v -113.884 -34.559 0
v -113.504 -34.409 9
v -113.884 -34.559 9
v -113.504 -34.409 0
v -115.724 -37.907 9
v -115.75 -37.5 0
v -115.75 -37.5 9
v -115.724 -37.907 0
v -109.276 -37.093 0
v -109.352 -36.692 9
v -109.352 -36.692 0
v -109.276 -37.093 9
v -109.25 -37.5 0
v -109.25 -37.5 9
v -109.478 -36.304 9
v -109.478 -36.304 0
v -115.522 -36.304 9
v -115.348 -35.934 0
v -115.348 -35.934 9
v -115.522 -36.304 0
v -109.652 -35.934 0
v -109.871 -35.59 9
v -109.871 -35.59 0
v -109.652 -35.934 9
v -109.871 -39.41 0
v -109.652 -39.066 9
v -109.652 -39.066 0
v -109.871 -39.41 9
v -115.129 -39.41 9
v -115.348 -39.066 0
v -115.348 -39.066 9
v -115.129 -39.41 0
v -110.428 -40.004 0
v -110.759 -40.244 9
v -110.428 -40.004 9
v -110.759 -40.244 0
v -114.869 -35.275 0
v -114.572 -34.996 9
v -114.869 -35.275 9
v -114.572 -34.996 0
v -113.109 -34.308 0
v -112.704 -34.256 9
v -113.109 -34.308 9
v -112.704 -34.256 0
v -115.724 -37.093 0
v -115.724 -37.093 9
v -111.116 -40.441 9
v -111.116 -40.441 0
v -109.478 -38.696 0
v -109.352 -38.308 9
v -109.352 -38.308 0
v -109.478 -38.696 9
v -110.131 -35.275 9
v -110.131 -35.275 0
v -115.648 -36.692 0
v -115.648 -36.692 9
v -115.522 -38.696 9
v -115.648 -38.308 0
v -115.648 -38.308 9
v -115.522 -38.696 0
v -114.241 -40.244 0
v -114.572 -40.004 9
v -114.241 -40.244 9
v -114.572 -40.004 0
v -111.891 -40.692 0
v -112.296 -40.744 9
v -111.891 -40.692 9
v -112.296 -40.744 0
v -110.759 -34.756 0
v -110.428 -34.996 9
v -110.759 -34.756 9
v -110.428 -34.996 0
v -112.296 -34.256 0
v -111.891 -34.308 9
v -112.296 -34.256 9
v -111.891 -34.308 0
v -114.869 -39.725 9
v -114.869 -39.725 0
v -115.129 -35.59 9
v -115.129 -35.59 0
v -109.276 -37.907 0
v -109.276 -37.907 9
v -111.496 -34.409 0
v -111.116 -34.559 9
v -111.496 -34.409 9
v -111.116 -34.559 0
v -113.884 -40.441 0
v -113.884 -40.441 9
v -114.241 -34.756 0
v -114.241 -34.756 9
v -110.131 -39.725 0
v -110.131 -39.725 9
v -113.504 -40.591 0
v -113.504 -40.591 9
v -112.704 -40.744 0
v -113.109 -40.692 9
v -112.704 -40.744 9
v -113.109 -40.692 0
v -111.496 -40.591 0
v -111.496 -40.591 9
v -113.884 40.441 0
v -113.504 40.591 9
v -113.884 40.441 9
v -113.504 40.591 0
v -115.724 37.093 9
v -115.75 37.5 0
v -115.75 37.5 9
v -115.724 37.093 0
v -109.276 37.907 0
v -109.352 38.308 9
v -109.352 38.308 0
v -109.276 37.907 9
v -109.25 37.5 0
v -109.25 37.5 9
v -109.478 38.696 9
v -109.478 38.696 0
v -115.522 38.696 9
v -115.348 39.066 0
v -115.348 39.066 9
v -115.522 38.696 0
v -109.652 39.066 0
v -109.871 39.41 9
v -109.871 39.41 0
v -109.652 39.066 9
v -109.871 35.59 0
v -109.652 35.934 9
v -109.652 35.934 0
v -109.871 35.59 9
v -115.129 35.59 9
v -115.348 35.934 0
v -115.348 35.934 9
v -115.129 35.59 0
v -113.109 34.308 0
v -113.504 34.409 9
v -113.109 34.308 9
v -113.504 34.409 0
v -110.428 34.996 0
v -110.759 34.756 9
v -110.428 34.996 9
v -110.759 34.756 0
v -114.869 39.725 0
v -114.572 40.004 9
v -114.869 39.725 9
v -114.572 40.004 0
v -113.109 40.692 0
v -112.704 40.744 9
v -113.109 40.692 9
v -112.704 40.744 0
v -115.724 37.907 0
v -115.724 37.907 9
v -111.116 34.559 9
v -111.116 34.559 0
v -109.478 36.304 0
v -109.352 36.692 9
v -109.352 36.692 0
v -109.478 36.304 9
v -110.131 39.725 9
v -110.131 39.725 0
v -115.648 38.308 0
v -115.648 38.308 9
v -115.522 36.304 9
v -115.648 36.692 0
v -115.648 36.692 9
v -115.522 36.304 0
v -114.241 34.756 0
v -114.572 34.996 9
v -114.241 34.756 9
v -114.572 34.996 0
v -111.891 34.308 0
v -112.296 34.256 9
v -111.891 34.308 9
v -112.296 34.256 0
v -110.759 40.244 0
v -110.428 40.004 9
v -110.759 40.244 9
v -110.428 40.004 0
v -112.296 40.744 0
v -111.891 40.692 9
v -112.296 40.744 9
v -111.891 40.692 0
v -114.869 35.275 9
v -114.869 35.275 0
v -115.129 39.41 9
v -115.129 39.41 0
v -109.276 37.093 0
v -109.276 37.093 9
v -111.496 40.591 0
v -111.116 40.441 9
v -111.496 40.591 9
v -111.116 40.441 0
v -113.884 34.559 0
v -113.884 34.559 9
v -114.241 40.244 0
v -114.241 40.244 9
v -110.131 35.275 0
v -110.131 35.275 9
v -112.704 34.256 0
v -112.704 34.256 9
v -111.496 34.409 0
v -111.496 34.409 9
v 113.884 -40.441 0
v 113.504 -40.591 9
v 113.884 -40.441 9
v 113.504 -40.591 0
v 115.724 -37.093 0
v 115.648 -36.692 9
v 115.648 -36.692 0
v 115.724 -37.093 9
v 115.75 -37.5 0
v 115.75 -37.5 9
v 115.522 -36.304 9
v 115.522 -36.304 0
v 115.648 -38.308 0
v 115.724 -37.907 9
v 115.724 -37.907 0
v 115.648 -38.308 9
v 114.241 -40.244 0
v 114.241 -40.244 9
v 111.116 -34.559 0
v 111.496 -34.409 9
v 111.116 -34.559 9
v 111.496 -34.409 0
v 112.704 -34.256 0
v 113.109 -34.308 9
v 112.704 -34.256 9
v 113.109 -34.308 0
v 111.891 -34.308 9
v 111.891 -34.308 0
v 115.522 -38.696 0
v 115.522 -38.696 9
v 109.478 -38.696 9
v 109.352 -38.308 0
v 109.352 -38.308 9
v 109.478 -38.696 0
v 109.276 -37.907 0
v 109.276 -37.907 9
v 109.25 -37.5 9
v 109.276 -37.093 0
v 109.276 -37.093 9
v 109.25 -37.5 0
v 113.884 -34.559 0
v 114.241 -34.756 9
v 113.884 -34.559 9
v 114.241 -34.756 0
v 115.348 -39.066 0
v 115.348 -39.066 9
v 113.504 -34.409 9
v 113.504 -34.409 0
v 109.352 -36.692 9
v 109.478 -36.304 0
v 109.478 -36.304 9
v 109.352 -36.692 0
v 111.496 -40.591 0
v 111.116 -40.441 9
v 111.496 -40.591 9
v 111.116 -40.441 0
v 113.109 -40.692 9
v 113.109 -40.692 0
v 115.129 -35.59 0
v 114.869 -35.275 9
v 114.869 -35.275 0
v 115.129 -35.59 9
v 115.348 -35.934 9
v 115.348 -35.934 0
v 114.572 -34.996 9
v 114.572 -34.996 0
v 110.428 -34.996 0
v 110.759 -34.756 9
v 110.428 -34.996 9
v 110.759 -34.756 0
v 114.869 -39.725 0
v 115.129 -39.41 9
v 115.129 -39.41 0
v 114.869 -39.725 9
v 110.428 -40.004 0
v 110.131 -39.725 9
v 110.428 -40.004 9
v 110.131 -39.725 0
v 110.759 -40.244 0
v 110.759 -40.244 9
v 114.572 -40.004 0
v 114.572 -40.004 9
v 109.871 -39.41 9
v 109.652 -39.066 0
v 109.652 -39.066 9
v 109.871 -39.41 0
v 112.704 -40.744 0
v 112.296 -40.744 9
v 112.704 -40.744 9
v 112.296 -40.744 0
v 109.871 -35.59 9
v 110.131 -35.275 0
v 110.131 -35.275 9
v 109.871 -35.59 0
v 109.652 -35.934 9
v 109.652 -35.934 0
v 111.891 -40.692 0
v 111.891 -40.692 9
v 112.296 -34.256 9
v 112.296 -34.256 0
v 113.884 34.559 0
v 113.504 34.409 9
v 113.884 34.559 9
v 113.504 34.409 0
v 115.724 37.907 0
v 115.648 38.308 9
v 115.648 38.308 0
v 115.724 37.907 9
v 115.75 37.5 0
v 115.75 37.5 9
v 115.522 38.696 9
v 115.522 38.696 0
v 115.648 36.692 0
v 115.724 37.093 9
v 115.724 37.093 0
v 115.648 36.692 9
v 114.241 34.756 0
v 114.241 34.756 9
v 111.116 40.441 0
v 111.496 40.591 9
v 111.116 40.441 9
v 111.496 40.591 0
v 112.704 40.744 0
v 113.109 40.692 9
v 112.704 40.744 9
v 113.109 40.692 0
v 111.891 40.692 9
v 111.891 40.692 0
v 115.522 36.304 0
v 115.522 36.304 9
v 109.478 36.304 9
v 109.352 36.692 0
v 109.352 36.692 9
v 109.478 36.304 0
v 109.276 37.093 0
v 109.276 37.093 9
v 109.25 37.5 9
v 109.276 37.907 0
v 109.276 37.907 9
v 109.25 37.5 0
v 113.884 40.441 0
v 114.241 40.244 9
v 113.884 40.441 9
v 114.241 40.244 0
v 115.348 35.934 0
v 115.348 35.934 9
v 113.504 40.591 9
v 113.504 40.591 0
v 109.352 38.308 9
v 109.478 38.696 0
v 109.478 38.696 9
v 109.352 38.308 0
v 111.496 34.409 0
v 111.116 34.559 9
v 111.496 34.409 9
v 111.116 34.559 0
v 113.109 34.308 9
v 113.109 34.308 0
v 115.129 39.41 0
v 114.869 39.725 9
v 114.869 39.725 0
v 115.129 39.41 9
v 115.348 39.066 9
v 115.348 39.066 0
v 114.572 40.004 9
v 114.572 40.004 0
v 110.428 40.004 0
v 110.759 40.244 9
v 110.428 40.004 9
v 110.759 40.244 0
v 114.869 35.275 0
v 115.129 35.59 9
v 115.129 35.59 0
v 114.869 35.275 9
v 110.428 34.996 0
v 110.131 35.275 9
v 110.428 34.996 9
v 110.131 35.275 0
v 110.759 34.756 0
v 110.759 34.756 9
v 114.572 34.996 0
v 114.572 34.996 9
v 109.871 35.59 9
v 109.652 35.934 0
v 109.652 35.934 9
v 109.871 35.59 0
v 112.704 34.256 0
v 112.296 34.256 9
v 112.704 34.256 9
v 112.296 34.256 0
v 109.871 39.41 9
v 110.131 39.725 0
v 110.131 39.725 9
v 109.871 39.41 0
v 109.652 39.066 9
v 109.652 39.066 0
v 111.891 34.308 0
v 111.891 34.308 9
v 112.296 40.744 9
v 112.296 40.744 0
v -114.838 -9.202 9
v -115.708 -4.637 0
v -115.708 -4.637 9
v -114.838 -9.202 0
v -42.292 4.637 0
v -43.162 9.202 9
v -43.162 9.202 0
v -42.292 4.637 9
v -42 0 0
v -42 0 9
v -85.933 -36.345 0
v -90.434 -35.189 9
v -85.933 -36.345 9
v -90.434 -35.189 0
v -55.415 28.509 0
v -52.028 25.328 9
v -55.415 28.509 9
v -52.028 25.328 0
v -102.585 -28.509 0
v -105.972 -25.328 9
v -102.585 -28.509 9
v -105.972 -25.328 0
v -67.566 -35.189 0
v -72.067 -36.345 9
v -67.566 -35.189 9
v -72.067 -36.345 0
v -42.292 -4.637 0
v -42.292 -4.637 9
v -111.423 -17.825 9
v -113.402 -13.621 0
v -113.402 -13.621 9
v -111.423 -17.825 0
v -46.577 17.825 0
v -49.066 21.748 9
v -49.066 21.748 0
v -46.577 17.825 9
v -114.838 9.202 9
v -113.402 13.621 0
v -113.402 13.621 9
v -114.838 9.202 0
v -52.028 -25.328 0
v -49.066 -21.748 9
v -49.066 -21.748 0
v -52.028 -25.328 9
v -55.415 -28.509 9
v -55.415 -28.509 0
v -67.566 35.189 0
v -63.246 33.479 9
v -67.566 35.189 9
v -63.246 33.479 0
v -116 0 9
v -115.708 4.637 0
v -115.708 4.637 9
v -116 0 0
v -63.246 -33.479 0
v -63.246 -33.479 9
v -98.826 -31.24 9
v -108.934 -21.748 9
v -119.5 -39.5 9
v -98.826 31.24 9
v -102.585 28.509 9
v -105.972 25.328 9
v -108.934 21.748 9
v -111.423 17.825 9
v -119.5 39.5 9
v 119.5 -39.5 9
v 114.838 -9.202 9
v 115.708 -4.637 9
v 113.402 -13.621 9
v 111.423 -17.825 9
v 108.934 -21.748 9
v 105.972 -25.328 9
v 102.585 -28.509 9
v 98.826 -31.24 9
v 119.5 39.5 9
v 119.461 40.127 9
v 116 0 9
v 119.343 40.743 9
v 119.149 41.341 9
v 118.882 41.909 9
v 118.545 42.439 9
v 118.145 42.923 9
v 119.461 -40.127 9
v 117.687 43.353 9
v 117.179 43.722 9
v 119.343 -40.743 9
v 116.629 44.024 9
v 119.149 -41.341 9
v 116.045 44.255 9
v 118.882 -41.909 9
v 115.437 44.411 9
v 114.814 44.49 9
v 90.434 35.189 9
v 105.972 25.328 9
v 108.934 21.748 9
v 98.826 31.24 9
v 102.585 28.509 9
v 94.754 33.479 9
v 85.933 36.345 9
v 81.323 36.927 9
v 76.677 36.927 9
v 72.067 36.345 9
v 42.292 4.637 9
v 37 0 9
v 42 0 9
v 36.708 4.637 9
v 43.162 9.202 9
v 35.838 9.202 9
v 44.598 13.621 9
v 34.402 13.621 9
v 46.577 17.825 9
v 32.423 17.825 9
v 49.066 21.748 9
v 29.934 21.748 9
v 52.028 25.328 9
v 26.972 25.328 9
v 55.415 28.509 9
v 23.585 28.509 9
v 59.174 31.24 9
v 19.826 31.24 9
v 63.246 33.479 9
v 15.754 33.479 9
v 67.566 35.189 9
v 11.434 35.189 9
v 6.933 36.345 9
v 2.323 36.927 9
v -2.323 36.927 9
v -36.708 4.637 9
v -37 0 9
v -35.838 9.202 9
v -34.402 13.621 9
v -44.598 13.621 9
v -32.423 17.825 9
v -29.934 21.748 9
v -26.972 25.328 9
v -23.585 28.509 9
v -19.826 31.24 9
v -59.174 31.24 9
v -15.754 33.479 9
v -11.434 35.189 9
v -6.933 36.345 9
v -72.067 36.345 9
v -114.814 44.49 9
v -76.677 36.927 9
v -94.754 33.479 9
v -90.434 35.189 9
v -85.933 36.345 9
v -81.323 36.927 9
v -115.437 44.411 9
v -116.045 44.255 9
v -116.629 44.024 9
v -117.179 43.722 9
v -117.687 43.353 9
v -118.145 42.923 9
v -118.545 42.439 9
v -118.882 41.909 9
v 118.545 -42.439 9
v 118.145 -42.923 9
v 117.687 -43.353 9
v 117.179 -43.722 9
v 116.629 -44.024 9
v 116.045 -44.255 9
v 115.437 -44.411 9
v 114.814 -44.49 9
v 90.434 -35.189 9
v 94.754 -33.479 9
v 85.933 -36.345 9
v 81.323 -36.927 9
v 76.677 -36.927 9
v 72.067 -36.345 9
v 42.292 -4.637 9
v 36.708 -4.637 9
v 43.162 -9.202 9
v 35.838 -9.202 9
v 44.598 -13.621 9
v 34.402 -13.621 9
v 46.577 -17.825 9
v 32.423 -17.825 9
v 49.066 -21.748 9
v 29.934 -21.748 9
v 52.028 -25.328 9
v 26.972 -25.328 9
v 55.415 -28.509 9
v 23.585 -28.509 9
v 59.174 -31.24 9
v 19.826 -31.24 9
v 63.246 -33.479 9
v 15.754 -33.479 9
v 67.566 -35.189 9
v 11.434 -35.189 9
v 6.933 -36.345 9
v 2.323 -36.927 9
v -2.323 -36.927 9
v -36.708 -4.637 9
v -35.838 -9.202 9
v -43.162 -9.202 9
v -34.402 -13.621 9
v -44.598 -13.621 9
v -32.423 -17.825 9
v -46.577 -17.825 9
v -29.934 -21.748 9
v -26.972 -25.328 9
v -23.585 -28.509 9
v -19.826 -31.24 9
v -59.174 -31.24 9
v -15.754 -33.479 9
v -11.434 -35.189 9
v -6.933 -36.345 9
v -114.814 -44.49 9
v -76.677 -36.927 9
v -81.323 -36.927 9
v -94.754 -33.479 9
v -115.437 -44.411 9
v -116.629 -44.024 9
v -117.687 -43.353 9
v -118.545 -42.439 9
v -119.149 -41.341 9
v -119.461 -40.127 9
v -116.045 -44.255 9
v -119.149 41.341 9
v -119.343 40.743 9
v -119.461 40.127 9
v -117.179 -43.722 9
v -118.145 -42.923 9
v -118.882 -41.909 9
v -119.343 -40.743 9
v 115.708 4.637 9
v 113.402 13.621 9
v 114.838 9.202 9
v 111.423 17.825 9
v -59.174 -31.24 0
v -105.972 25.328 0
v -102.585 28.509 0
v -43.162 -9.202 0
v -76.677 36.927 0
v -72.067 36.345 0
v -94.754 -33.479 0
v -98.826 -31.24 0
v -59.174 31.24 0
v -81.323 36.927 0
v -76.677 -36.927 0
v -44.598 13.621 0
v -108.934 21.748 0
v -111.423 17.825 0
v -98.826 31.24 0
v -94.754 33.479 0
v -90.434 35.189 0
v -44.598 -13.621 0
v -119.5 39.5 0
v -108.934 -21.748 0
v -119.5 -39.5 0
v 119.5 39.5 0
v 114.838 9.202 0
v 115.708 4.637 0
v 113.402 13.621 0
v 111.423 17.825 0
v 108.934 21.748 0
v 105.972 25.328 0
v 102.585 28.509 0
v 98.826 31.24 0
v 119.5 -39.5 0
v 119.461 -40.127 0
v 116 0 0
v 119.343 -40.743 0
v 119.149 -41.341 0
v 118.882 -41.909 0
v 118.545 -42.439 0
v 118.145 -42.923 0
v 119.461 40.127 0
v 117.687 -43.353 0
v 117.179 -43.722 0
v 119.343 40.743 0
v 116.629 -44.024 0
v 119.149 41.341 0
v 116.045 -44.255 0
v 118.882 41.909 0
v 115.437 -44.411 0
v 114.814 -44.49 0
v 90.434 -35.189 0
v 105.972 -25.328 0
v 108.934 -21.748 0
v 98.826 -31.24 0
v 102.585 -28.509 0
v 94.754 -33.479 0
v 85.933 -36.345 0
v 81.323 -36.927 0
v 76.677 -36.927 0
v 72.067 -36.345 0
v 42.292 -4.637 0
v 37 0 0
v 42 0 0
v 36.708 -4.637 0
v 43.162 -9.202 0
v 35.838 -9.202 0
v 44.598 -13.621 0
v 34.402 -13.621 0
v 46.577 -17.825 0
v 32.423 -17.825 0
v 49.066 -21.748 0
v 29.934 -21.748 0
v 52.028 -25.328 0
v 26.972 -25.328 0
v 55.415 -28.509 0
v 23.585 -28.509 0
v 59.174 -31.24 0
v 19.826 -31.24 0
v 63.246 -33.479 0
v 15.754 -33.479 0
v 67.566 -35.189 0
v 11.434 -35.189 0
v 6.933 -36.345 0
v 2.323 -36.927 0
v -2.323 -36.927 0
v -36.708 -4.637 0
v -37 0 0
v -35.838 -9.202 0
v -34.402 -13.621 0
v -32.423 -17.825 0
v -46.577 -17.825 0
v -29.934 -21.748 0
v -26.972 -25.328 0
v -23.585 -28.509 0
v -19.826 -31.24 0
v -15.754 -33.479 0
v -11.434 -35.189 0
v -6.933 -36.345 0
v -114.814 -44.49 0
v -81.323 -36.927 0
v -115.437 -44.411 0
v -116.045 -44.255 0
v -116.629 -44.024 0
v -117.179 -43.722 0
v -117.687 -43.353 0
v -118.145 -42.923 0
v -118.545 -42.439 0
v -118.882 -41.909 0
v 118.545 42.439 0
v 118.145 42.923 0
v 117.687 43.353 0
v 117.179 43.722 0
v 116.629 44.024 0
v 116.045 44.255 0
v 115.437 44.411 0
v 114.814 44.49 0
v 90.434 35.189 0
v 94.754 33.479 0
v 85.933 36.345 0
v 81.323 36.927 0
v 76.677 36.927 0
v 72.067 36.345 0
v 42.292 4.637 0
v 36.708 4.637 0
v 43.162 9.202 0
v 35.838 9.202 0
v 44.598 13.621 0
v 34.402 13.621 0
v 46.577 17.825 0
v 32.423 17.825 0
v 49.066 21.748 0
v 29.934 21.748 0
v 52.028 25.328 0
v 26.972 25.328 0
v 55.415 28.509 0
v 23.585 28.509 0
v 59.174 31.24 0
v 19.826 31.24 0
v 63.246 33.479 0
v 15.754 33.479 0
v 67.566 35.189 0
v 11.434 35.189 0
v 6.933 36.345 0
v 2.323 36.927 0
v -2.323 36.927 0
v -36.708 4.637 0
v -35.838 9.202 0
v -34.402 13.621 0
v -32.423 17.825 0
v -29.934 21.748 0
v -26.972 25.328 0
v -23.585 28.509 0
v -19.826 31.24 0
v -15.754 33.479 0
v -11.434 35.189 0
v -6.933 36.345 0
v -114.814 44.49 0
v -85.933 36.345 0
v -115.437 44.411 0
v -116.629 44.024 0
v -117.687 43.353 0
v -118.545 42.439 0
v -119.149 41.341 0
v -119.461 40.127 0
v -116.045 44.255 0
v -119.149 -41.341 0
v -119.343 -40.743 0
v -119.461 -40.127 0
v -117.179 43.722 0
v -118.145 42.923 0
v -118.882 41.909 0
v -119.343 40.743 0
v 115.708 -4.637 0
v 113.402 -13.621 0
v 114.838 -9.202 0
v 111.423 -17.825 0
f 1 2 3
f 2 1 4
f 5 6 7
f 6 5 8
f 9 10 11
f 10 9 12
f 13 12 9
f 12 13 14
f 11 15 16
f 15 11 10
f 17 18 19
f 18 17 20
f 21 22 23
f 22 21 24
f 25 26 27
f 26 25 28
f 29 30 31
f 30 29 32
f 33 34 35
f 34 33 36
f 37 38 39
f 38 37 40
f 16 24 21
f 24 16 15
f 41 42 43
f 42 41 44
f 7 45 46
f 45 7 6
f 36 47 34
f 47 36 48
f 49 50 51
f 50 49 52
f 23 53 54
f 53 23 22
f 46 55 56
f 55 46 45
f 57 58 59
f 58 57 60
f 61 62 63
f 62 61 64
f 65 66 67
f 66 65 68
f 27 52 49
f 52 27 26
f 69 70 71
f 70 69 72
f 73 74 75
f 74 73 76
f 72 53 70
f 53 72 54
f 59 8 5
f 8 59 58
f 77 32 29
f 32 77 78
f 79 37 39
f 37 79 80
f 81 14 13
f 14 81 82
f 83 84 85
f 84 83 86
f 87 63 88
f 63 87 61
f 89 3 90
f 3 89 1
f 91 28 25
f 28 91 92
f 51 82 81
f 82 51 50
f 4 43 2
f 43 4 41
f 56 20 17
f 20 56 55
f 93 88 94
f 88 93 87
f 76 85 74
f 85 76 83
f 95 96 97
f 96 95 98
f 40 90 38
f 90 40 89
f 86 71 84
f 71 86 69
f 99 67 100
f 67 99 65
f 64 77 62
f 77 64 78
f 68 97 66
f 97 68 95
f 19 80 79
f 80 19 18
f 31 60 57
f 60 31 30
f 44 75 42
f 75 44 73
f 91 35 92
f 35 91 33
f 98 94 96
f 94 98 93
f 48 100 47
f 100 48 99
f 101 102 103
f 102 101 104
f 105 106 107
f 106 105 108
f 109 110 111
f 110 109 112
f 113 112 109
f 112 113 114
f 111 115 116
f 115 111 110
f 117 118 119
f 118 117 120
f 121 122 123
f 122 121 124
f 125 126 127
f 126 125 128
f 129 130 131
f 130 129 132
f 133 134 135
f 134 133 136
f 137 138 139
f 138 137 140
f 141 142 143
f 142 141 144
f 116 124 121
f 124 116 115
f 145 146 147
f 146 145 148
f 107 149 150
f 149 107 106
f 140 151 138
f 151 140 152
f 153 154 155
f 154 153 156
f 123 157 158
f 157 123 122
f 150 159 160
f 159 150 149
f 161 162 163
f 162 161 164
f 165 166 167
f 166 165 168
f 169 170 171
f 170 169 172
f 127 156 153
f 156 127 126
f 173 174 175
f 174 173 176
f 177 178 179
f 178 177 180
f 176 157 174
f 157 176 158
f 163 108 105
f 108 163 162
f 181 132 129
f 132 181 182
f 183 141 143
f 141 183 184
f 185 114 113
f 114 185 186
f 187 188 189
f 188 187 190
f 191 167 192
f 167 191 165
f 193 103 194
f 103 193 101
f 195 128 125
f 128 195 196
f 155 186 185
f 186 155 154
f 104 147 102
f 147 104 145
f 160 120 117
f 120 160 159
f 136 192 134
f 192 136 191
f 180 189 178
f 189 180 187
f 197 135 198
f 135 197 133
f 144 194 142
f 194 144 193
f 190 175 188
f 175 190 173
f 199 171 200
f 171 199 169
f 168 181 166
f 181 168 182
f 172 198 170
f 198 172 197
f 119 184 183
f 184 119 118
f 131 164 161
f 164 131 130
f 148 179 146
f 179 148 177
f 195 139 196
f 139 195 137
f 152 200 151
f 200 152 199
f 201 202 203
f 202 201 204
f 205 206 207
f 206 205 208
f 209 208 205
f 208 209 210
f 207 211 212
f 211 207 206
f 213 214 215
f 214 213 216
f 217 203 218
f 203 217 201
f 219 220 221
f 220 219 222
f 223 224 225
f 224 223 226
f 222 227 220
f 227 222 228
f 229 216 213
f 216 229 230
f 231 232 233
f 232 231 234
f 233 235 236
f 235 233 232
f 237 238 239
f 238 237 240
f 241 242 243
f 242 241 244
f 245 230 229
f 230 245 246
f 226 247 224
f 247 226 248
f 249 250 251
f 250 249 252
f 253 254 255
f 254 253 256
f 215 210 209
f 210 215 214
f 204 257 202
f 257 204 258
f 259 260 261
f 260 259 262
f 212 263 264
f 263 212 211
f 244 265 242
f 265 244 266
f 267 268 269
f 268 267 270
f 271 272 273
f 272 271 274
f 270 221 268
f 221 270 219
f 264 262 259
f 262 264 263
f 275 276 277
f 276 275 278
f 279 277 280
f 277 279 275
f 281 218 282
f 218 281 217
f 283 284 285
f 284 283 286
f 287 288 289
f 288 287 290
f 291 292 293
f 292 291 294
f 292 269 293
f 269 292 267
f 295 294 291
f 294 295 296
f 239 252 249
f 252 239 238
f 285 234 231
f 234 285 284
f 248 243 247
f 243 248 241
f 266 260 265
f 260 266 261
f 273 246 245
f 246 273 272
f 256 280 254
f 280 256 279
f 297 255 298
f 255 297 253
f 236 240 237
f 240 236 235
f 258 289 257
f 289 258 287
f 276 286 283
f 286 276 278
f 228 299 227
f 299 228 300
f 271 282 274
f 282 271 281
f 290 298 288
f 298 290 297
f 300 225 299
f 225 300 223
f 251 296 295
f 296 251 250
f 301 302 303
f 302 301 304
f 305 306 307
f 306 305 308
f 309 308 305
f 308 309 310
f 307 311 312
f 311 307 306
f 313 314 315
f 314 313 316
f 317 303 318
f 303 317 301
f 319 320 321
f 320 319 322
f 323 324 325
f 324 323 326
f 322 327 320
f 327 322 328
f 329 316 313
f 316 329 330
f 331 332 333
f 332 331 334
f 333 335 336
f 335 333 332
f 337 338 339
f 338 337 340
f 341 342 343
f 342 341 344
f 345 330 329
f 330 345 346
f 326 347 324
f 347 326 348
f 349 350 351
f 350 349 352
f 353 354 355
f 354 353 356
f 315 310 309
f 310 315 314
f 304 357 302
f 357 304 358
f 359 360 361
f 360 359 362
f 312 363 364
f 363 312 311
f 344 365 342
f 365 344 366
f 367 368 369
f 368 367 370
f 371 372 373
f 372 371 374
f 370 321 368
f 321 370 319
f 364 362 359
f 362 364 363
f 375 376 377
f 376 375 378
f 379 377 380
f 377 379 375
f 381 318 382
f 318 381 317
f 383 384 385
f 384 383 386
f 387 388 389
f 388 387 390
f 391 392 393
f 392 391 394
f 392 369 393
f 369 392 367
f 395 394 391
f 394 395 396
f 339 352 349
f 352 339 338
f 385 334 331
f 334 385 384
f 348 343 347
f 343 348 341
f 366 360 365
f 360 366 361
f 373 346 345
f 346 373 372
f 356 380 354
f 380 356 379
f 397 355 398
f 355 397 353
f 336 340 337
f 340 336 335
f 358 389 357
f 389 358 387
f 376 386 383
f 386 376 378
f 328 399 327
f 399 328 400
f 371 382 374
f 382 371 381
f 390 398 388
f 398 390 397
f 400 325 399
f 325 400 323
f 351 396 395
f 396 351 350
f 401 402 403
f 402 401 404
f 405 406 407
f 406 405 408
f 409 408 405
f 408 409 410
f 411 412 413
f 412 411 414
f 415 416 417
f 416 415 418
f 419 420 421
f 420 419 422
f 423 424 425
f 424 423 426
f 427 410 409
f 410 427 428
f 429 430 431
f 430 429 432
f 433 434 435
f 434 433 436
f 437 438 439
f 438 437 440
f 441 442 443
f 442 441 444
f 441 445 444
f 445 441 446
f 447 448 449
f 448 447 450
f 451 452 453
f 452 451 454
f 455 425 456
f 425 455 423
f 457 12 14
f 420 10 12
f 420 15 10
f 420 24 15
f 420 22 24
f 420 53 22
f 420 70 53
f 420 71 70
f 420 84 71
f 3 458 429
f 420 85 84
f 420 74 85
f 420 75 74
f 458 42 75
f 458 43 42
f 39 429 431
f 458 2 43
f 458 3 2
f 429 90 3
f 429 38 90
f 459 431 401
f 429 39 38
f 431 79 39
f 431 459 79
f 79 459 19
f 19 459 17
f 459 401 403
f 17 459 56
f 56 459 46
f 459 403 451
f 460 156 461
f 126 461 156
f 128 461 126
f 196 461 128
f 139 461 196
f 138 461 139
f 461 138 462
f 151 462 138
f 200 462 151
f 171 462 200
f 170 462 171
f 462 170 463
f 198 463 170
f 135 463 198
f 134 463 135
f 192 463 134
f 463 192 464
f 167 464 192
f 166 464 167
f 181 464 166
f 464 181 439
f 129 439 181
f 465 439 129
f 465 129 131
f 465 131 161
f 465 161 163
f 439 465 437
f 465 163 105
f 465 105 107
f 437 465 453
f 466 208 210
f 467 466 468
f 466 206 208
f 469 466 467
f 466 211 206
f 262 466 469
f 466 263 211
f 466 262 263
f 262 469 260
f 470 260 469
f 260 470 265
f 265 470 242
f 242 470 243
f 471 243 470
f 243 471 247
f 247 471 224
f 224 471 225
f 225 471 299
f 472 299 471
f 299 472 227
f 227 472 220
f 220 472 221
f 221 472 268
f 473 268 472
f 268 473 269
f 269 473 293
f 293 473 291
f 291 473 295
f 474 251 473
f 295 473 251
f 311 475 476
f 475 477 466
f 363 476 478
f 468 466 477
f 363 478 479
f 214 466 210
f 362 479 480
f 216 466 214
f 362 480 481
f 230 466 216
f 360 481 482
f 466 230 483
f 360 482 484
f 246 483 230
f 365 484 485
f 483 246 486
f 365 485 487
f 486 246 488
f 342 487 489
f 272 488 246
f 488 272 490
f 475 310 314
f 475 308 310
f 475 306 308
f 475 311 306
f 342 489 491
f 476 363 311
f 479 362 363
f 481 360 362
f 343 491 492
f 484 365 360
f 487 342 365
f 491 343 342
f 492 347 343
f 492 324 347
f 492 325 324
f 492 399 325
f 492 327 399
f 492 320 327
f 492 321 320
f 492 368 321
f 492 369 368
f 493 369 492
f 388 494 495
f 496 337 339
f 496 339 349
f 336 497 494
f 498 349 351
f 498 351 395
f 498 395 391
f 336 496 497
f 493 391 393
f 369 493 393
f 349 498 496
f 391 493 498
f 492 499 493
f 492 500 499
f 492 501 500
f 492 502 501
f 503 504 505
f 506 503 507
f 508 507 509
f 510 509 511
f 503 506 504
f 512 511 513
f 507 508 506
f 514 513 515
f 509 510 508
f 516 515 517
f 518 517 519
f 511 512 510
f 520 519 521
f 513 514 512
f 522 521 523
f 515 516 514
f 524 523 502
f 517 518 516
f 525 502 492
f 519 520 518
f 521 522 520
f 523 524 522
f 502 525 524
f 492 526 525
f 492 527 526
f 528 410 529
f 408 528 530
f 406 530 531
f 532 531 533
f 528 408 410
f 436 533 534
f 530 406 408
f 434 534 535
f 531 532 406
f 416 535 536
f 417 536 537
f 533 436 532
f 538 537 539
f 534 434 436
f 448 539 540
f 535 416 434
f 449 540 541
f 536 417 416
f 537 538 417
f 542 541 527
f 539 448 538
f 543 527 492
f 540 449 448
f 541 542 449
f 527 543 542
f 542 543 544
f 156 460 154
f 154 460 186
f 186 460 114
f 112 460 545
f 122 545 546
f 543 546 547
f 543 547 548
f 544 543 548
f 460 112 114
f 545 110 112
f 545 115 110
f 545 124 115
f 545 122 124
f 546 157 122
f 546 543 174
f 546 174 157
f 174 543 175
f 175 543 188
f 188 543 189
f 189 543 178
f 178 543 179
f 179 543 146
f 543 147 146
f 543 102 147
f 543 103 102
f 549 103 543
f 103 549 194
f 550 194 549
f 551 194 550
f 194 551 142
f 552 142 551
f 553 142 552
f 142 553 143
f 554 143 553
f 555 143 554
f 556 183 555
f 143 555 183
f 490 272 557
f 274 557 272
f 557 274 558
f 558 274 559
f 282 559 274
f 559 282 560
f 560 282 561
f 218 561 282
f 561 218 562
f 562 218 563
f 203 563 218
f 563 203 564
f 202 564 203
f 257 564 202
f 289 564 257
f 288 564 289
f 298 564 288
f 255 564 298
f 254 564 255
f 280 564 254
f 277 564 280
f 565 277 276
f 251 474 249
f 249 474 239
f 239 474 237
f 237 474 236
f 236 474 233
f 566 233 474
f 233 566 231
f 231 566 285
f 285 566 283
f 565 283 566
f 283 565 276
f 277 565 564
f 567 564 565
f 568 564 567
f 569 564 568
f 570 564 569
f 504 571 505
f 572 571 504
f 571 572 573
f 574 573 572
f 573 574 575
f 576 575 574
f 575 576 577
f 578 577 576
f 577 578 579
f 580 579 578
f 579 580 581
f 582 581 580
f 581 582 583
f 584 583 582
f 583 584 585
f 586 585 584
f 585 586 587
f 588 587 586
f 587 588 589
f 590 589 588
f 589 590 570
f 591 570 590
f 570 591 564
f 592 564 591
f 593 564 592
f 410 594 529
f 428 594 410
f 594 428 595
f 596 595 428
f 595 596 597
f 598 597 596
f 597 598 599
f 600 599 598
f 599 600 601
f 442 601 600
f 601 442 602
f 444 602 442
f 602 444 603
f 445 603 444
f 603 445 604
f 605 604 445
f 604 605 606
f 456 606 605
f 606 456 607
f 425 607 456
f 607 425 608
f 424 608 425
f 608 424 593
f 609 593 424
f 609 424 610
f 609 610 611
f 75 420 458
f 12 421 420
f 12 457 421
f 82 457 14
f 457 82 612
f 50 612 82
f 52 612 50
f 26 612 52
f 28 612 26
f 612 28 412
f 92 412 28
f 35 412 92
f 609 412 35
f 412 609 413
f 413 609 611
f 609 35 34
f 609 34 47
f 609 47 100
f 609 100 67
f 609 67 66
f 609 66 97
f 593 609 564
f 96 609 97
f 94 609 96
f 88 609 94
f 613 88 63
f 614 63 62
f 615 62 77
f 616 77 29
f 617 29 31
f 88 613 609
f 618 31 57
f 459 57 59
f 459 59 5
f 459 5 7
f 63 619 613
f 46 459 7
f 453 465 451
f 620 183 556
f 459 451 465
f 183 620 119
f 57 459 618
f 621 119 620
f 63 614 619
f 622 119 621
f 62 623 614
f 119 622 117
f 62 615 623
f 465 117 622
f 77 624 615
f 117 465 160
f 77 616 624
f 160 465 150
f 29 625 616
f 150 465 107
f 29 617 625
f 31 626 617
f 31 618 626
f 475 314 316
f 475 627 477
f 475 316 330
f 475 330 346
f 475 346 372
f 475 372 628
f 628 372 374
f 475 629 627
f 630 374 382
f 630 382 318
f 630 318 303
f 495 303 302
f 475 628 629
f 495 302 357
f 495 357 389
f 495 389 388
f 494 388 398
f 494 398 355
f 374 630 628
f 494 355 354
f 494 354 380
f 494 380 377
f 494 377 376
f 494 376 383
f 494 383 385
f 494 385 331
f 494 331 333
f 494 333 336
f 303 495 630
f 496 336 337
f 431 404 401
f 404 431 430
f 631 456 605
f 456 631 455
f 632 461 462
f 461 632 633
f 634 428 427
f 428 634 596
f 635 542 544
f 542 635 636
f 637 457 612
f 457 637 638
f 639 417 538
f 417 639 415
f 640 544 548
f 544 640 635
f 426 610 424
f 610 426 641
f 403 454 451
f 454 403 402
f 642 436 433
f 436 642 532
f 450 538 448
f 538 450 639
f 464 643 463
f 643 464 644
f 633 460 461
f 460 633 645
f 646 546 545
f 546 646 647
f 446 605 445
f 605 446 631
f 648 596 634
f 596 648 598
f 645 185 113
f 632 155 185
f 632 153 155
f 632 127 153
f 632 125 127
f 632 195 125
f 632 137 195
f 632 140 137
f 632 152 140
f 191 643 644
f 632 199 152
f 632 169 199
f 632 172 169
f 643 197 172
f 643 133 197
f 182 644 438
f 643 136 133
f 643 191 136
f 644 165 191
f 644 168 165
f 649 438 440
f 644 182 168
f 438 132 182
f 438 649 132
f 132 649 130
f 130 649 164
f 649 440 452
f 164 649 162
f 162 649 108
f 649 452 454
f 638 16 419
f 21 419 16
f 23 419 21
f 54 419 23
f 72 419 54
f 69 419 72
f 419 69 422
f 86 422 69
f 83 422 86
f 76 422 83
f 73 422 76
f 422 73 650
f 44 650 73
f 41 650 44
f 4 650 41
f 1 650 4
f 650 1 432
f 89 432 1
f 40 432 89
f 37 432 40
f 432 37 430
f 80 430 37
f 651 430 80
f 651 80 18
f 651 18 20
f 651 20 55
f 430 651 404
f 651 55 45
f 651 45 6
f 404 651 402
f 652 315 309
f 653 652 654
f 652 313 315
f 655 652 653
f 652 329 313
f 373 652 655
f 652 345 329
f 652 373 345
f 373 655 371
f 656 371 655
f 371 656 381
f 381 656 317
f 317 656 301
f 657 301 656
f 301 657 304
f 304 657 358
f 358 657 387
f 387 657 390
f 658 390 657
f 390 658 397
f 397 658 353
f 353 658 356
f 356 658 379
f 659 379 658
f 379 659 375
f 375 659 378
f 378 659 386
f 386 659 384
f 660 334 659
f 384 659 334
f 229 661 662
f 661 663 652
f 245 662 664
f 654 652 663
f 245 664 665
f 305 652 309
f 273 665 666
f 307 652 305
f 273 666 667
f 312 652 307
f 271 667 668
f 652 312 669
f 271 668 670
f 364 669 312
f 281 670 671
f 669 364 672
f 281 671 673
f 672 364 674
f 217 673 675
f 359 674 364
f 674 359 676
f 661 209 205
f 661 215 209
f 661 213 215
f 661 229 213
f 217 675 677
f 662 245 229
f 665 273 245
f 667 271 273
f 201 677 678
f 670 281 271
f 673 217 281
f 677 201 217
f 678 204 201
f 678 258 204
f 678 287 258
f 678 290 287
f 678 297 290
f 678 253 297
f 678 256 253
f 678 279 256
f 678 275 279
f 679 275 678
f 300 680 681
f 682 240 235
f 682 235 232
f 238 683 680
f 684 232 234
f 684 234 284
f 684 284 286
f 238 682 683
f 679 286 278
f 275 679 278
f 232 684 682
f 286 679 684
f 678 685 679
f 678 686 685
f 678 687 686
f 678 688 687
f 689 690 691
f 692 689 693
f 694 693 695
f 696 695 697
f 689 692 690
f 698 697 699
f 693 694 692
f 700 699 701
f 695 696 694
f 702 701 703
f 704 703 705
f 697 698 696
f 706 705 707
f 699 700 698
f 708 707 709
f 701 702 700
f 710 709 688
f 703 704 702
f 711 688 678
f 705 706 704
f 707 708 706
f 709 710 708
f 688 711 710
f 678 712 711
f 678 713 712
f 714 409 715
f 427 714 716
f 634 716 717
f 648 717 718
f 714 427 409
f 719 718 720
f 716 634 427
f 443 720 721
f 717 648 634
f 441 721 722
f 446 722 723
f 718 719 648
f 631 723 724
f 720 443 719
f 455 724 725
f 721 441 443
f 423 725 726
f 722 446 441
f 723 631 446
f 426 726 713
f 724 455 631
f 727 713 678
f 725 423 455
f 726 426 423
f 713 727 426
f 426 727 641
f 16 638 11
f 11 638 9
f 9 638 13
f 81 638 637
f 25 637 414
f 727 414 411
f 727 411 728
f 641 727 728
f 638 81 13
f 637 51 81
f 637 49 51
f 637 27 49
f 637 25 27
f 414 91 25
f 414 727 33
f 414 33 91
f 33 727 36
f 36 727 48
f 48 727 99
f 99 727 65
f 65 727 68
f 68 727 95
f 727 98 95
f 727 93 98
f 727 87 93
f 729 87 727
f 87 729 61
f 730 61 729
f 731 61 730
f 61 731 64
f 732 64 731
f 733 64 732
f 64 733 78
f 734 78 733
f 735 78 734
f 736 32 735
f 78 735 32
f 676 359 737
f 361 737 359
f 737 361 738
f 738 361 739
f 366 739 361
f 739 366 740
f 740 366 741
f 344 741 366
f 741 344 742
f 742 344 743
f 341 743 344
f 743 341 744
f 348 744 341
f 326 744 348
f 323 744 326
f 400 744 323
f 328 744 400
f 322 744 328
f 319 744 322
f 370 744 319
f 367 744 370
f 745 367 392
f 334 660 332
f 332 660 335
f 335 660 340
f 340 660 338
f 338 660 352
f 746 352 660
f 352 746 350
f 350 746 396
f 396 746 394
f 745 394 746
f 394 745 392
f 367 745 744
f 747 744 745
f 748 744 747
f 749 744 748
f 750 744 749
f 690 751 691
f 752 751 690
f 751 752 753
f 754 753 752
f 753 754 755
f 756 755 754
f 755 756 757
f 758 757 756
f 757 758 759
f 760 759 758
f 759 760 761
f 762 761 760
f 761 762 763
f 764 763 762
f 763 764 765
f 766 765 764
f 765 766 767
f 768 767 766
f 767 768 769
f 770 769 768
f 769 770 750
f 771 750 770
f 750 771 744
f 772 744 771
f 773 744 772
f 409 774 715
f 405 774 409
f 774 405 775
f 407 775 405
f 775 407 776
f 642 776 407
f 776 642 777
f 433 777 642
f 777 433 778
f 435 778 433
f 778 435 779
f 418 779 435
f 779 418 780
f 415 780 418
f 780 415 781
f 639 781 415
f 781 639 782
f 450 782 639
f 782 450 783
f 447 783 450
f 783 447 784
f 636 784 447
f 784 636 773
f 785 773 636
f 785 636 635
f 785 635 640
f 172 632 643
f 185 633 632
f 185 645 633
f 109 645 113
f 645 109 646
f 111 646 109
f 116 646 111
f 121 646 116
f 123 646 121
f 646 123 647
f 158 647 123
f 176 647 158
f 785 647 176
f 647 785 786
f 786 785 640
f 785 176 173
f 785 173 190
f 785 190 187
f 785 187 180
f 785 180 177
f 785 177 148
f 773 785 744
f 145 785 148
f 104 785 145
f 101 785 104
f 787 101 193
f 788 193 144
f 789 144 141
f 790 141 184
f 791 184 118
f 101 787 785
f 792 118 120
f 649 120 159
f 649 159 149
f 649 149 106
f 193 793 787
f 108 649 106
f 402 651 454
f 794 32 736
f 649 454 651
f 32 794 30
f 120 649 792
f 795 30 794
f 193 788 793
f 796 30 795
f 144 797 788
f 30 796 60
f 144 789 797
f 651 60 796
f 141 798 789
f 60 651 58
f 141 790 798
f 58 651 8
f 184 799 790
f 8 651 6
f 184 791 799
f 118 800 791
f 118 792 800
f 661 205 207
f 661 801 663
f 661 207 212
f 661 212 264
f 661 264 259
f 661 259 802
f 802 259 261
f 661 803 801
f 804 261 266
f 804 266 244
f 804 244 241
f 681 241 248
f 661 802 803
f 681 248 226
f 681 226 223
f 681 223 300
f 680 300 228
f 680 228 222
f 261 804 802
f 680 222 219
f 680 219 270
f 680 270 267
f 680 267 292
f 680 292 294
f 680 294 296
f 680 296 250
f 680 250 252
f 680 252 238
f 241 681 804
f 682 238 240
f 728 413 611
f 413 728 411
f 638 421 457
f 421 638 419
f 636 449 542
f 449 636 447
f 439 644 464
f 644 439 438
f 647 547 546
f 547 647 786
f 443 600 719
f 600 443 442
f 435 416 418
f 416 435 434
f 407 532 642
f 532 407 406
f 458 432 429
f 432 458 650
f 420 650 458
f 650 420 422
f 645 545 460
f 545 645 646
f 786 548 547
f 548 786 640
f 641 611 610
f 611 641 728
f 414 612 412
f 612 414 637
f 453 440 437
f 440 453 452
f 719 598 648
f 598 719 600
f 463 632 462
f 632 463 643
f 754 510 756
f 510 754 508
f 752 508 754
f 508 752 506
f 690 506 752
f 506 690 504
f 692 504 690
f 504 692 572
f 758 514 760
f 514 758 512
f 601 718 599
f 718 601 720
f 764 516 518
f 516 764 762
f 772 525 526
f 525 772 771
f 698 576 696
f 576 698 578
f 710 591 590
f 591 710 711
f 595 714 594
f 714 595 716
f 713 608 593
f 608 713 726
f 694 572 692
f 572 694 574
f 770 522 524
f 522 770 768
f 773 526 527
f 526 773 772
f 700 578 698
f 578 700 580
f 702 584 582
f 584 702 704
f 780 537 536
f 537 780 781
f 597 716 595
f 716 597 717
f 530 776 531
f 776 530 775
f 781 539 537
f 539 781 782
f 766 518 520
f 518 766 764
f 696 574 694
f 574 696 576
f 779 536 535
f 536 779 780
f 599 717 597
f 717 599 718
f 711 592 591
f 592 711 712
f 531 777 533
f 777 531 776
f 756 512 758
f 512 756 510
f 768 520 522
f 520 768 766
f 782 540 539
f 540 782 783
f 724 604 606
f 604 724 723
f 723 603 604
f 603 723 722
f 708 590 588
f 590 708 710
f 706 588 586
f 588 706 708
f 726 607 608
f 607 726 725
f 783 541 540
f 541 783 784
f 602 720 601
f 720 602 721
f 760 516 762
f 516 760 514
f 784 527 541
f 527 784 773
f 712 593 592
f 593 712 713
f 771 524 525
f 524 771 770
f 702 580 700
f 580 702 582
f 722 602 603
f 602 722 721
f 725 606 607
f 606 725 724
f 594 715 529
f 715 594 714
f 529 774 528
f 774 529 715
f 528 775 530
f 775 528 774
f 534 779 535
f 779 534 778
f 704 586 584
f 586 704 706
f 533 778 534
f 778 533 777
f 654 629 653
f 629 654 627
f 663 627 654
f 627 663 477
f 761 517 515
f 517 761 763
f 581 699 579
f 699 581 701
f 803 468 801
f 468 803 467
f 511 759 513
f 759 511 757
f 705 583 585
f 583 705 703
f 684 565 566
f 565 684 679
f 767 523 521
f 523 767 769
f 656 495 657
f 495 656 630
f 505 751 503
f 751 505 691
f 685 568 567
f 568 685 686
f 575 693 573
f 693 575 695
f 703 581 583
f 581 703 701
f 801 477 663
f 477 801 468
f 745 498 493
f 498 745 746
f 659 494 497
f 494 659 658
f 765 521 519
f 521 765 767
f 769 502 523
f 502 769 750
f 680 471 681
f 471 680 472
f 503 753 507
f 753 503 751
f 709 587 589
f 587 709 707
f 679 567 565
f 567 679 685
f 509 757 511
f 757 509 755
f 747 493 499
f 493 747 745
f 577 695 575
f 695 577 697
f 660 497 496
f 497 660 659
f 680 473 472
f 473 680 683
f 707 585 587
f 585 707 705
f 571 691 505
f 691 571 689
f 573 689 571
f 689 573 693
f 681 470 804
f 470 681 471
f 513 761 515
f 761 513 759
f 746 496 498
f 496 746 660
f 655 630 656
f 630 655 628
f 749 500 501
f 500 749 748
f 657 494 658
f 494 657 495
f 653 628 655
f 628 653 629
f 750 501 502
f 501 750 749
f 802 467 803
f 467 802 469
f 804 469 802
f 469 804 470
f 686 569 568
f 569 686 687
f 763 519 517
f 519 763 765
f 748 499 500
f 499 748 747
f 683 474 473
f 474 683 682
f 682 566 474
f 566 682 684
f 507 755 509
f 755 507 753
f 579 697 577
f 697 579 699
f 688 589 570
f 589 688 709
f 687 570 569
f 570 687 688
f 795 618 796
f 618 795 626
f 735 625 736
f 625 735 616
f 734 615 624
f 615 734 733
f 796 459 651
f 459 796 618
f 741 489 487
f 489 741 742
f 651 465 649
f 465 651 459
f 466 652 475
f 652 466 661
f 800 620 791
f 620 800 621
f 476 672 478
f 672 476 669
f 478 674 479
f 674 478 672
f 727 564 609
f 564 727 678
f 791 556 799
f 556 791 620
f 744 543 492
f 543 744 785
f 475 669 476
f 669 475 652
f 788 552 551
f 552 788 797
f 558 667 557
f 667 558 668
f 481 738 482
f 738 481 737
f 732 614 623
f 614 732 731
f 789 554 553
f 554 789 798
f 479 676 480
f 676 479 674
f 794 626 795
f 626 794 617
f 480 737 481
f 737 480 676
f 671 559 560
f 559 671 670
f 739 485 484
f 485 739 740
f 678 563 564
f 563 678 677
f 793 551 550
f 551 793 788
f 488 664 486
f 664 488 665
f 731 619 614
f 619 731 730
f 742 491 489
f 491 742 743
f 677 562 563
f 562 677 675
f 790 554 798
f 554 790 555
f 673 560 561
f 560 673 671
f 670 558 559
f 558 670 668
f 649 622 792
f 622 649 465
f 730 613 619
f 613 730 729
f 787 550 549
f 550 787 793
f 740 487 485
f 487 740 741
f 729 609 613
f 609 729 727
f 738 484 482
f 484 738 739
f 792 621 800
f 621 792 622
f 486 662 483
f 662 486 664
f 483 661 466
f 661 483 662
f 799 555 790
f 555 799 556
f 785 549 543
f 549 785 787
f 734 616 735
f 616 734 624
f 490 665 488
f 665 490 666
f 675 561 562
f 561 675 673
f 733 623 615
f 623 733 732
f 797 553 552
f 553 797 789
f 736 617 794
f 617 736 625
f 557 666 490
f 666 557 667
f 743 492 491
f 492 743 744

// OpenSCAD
$fn = 50;


difference() {
	union() {
		hull() {
			translate(v = [-114.5000000000, 39.5000000000, 0]) {
				cylinder(h = 9, r = 5);
			}
			translate(v = [114.5000000000, 39.5000000000, 0]) {
				cylinder(h = 9, r = 5);
			}
			translate(v = [-114.5000000000, -39.5000000000, 0]) {
				cylinder(h = 9, r = 5);
			}
			translate(v = [114.5000000000, -39.5000000000, 0]) {
				cylinder(h = 9, r = 5);
			}
		}
	}
	union() {
		#translate(v = [-112.5000000000, -37.5000000000, -100.0000000000]) {
			cylinder(h = 200, r = 3.2500000000);
		}
		#translate(v = [-112.5000000000, 37.5000000000, -100.0000000000]) {
			cylinder(h = 200, r = 3.2500000000);
		}
		#translate(v = [112.5000000000, -37.5000000000, -100.0000000000]) {
			cylinder(h = 200, r = 3.2500000000);
		}
		#translate(v = [112.5000000000, 37.5000000000, -100.0000000000]) {
			cylinder(h = 200, r = 3.2500000000);
		}
		#translate(v = [-79.0000000000, 0, 0]) {
			cylinder(h = 9, r = 37.0000000000);
		}
		#cylinder(h = 9, r = 37.0000000000);
		#translate(v = [79.0000000000, 0, 0]) {
			cylinder(h = 9, r = 37.0000000000);
		}
	}
}
